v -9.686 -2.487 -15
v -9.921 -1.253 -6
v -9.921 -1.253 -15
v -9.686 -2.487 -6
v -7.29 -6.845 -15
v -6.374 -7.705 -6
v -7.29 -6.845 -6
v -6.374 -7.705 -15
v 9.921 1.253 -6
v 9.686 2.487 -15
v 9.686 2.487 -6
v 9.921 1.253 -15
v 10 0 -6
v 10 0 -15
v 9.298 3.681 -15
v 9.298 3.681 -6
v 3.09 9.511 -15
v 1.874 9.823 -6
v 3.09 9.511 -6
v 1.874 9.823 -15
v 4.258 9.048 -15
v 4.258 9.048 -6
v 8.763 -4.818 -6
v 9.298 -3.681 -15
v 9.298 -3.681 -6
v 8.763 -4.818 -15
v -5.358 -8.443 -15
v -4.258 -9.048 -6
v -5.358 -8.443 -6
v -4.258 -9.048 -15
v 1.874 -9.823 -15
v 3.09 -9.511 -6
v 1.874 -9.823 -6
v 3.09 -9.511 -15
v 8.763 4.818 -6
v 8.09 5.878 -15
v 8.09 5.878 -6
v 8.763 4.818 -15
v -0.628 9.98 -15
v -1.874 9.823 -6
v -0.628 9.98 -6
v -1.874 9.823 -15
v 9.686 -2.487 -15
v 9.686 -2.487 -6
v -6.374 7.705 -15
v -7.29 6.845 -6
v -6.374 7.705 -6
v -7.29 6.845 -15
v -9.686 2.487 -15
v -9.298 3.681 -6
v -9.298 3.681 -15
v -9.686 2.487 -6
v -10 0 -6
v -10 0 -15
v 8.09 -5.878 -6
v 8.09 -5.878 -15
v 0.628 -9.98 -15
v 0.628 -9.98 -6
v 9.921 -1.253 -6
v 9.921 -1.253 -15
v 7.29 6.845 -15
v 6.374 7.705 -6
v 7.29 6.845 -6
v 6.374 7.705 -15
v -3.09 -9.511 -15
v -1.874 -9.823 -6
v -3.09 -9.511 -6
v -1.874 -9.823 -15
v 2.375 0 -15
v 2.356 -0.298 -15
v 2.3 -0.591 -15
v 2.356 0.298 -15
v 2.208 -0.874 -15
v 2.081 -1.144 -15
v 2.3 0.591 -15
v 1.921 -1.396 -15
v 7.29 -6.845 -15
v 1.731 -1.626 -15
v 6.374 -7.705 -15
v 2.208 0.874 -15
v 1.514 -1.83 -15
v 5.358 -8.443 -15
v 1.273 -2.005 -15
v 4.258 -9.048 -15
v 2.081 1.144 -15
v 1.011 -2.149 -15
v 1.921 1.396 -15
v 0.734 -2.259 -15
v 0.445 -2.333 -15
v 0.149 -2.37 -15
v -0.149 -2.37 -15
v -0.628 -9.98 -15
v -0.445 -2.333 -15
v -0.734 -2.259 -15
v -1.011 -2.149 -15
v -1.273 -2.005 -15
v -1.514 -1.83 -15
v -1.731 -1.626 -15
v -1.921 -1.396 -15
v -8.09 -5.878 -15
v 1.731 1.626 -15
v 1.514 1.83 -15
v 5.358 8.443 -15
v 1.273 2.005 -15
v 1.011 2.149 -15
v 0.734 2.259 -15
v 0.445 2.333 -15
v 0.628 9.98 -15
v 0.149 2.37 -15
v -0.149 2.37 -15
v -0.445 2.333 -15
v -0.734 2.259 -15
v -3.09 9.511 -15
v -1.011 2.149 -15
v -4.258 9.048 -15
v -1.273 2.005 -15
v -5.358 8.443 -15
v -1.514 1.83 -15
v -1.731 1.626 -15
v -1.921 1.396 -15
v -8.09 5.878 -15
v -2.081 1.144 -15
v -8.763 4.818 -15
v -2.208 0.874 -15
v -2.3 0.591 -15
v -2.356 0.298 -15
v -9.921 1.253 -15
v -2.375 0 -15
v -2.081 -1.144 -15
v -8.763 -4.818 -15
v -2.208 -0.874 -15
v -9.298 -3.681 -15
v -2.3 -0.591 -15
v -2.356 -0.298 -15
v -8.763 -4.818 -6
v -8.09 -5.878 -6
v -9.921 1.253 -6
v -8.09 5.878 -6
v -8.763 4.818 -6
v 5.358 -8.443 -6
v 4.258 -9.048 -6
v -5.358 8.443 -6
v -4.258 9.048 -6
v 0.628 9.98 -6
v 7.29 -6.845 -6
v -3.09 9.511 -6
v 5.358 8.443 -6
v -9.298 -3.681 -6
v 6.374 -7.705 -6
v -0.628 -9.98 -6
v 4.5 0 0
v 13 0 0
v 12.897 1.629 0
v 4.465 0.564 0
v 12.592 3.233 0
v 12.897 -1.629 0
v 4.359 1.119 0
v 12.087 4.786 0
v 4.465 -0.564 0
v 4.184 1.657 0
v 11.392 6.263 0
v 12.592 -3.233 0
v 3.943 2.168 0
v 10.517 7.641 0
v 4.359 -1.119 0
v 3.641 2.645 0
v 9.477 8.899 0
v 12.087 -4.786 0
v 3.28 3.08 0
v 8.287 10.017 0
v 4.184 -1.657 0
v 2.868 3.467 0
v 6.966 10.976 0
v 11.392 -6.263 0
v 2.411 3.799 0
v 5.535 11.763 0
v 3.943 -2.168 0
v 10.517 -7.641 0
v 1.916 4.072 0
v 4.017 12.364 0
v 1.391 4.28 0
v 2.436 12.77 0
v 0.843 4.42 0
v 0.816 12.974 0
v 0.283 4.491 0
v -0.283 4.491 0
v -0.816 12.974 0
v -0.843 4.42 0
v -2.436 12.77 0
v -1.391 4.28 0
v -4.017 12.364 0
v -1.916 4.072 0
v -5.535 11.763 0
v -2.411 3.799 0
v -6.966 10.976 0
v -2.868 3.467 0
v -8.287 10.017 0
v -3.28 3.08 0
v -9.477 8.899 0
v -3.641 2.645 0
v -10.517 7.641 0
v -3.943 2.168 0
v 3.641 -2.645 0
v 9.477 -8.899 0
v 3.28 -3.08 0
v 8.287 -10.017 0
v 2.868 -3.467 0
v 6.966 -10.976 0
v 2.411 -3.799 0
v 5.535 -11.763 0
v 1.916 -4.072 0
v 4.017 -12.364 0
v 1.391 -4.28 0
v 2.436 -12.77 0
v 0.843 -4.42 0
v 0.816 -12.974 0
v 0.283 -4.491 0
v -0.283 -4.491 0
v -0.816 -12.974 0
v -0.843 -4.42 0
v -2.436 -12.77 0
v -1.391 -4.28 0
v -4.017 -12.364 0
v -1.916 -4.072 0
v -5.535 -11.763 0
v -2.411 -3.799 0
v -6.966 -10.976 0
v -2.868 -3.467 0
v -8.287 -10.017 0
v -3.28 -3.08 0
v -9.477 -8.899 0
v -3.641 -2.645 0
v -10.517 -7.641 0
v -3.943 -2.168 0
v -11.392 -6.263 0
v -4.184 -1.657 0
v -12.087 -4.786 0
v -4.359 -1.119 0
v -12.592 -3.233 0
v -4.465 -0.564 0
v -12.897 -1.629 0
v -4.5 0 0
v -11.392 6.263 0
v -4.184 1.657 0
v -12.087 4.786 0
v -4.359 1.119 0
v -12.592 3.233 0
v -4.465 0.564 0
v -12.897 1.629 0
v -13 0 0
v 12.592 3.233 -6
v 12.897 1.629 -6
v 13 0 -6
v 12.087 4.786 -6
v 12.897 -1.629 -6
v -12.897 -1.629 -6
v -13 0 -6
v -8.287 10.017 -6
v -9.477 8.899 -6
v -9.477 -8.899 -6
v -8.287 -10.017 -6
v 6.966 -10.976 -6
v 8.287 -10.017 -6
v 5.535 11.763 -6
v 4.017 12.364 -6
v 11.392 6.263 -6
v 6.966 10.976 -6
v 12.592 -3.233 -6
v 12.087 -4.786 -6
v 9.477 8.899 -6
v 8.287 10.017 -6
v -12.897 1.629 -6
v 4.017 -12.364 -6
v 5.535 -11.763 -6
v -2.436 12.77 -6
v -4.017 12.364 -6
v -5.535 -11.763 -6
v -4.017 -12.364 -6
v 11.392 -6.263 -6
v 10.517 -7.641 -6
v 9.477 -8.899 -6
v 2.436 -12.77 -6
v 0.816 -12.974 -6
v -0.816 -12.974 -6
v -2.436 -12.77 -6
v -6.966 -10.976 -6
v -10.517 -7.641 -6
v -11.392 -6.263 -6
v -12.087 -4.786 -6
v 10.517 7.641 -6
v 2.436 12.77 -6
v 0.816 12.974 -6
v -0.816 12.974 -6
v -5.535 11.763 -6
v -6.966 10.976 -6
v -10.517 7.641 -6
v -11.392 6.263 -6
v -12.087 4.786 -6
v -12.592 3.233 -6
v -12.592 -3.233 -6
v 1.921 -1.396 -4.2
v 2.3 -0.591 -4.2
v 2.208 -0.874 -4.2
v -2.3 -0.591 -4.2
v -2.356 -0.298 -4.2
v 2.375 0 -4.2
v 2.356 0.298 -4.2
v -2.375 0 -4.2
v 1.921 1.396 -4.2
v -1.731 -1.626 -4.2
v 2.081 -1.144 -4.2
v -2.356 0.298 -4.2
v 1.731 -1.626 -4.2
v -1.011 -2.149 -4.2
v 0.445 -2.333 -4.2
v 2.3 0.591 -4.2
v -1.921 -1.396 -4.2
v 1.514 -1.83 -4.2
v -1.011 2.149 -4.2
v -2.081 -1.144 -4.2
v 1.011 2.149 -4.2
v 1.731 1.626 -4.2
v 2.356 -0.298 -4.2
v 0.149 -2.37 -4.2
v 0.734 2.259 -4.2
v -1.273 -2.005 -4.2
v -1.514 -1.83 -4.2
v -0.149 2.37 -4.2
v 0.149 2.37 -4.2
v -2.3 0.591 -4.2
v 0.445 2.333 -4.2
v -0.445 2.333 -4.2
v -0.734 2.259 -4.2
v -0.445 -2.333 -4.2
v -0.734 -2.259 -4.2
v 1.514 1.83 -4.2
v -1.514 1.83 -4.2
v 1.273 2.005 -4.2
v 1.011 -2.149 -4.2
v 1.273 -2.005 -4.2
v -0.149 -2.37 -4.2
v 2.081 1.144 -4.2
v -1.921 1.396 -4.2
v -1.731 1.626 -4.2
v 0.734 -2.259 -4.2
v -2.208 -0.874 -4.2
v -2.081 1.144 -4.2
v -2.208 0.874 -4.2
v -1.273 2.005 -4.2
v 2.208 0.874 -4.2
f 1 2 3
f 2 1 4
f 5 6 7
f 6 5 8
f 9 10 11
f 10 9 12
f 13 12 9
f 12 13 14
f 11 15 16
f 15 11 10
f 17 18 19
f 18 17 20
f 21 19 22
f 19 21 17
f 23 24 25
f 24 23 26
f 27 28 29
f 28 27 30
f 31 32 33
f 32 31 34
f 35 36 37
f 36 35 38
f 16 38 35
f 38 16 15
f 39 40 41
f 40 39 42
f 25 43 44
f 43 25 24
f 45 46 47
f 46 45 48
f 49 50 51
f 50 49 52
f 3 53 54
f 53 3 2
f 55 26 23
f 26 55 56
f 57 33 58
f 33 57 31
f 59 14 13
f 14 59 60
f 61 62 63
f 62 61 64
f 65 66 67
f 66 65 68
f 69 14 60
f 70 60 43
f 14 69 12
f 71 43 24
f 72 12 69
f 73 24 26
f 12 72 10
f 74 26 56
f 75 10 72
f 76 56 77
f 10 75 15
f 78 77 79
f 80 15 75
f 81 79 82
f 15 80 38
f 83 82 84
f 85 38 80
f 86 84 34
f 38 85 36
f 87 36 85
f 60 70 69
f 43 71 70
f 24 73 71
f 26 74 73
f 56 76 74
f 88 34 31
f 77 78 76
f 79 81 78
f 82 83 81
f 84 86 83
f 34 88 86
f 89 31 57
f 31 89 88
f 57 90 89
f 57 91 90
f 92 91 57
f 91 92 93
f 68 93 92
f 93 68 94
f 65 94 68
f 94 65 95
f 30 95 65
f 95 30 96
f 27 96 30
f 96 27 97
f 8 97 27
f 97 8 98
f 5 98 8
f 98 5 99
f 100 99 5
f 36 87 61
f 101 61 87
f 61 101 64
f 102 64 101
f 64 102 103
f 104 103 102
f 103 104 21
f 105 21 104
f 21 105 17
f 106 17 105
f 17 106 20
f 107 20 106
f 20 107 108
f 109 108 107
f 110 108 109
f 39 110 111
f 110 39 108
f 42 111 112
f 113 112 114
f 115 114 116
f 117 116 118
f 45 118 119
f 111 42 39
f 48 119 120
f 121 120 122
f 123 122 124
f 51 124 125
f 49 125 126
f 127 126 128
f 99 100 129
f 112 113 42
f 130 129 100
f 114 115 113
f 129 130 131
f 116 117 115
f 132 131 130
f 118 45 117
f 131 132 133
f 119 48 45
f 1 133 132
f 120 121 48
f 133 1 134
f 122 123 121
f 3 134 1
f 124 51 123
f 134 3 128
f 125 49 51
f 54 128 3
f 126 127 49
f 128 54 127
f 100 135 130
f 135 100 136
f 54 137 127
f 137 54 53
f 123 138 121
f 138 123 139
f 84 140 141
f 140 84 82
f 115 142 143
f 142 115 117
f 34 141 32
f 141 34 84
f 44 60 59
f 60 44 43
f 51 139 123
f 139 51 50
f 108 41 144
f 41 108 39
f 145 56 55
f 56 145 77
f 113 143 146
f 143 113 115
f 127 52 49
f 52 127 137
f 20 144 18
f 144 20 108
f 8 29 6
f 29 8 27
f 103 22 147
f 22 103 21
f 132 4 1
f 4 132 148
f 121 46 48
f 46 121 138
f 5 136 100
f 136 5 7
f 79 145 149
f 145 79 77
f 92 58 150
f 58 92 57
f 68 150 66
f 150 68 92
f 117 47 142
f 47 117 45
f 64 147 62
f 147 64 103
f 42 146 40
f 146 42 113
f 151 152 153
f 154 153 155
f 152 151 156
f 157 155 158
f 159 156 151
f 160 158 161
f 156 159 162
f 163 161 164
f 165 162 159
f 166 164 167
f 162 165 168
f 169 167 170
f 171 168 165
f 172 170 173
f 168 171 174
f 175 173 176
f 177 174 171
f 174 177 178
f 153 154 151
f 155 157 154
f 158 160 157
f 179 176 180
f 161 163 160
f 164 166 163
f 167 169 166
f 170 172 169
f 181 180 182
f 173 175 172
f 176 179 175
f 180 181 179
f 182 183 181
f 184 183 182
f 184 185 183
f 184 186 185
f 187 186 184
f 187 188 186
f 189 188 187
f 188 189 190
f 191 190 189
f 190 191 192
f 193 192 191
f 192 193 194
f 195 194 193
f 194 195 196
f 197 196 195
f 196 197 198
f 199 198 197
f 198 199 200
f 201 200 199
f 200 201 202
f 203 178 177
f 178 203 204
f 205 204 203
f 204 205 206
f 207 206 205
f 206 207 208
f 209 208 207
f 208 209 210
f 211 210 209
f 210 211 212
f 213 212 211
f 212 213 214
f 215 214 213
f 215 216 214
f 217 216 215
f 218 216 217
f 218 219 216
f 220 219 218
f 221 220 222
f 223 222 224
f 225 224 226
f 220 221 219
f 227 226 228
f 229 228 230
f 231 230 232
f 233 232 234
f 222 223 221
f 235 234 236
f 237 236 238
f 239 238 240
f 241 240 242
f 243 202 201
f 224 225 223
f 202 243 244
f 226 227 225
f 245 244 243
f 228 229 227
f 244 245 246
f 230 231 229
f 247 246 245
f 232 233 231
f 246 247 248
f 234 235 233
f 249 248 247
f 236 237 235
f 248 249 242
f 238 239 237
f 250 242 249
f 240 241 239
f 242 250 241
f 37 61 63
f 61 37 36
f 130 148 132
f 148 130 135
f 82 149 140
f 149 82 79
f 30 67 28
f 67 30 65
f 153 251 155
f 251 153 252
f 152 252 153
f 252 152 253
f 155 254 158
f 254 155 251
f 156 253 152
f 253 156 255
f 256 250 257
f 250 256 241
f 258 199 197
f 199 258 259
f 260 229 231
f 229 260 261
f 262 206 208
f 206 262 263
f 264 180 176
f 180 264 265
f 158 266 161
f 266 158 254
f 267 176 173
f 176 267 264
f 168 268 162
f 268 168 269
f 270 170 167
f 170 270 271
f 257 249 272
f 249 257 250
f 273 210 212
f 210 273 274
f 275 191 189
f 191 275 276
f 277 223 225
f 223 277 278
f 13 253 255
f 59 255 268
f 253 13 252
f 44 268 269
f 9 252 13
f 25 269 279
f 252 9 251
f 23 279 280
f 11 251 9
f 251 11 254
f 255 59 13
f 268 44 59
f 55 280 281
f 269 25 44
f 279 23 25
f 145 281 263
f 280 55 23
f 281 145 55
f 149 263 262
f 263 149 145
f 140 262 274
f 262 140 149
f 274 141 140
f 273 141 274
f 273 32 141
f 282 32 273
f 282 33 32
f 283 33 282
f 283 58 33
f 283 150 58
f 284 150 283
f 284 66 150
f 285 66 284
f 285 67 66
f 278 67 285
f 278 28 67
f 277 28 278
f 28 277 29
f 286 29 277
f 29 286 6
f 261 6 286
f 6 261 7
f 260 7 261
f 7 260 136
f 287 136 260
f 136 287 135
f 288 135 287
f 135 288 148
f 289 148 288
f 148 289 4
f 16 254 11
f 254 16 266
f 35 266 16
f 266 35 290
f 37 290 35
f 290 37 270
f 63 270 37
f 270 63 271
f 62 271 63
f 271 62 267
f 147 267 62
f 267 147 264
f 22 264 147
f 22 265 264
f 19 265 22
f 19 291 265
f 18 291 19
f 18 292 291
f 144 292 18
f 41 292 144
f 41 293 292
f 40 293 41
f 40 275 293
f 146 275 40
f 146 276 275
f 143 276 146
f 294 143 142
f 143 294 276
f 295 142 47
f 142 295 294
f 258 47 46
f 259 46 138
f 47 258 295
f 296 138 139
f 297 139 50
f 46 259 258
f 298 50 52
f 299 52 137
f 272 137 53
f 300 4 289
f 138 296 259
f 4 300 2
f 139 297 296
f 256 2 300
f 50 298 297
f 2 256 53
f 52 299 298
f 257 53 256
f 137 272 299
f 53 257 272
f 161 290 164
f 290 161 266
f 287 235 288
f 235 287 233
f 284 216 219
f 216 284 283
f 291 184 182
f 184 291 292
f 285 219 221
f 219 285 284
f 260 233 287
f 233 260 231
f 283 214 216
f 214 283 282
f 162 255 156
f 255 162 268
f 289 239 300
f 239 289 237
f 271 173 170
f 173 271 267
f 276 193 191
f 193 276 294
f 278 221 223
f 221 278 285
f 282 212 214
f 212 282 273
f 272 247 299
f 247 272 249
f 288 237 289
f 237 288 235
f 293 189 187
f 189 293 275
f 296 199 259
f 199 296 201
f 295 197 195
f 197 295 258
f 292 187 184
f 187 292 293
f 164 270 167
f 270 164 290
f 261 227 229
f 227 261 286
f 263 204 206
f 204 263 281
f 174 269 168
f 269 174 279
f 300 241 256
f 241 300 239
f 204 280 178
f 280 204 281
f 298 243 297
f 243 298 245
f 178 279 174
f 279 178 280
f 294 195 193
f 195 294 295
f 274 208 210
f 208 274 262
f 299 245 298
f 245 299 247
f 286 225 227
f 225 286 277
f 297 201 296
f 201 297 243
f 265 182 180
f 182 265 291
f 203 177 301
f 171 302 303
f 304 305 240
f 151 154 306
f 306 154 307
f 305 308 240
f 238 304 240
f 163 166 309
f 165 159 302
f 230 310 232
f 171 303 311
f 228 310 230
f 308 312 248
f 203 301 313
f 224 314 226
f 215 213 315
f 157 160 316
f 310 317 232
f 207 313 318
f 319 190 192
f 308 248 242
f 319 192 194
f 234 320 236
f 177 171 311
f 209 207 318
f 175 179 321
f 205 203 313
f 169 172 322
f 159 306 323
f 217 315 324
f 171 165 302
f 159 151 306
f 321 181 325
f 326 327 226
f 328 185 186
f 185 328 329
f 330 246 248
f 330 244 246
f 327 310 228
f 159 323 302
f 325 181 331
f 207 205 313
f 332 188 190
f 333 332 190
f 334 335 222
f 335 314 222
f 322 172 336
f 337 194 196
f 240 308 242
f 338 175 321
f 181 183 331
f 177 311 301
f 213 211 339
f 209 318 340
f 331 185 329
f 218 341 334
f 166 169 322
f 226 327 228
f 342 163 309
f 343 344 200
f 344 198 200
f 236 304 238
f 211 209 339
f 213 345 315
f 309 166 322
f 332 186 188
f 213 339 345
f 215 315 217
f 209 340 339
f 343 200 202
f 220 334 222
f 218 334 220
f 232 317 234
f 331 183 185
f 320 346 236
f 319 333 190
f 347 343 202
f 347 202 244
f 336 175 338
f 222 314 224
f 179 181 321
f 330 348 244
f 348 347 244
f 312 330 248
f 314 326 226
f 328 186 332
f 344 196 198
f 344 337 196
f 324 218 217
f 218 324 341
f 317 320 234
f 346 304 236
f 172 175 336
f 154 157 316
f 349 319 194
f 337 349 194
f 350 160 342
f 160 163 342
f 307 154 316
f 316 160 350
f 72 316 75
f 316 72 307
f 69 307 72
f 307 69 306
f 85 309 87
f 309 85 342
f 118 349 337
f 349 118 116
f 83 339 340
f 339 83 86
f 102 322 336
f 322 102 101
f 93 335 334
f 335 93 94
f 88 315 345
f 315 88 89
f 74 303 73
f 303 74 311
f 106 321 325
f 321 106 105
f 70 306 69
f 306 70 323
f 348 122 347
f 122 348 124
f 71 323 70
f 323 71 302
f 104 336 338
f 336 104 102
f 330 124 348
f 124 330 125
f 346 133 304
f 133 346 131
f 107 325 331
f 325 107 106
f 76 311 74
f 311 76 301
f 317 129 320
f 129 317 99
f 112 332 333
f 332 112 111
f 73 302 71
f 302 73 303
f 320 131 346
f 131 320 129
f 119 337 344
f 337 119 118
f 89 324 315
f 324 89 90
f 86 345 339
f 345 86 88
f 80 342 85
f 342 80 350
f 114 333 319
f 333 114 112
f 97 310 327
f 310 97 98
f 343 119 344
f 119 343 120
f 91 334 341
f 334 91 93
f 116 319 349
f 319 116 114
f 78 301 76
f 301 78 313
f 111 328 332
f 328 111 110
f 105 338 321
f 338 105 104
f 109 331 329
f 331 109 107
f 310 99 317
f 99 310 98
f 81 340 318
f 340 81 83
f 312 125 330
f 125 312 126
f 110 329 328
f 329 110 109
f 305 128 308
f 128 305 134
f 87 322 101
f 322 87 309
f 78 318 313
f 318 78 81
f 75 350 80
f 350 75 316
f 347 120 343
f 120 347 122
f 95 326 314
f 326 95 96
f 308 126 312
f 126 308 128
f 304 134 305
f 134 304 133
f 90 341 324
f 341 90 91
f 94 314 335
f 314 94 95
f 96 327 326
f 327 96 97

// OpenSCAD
$fn = 50;


difference() {
	union() {
		translate(v = [0, 0, -15.0000000000]) {
			cylinder(h = 15, r = 10.0000000000);
		}
		translate(v = [0, 0, -6.0000000000]) {
			cylinder(h = 6, r = 13.0000000000);
		}
	}
	union() {
		translate(v = [0, 0, 0]) {
			rotate(a = [0, 0, 0]) {
				difference() {
					union() {
						#translate(v = [0, 0, -15.0000000000]) {
							cylinder(h = 15, r = 2.2500000000);
						}
						#translate(v = [0, 0, -4.2000000000]) {
							cylinder(h = 4.2000000000, r = 10.0000000000, r1 = 2.3750000000, r2 = 4.5000000000);
						}
						#translate(v = [0, 0, -15.0000000000]) {
							cylinder(h = 15, r = 2.3750000000);
						}
						#translate(v = [0, 0, -15.0000000000]) {
							cylinder(h = 15, r = 2.2500000000);
						}
					}
					union();
				}
			}
		}
	}
}
